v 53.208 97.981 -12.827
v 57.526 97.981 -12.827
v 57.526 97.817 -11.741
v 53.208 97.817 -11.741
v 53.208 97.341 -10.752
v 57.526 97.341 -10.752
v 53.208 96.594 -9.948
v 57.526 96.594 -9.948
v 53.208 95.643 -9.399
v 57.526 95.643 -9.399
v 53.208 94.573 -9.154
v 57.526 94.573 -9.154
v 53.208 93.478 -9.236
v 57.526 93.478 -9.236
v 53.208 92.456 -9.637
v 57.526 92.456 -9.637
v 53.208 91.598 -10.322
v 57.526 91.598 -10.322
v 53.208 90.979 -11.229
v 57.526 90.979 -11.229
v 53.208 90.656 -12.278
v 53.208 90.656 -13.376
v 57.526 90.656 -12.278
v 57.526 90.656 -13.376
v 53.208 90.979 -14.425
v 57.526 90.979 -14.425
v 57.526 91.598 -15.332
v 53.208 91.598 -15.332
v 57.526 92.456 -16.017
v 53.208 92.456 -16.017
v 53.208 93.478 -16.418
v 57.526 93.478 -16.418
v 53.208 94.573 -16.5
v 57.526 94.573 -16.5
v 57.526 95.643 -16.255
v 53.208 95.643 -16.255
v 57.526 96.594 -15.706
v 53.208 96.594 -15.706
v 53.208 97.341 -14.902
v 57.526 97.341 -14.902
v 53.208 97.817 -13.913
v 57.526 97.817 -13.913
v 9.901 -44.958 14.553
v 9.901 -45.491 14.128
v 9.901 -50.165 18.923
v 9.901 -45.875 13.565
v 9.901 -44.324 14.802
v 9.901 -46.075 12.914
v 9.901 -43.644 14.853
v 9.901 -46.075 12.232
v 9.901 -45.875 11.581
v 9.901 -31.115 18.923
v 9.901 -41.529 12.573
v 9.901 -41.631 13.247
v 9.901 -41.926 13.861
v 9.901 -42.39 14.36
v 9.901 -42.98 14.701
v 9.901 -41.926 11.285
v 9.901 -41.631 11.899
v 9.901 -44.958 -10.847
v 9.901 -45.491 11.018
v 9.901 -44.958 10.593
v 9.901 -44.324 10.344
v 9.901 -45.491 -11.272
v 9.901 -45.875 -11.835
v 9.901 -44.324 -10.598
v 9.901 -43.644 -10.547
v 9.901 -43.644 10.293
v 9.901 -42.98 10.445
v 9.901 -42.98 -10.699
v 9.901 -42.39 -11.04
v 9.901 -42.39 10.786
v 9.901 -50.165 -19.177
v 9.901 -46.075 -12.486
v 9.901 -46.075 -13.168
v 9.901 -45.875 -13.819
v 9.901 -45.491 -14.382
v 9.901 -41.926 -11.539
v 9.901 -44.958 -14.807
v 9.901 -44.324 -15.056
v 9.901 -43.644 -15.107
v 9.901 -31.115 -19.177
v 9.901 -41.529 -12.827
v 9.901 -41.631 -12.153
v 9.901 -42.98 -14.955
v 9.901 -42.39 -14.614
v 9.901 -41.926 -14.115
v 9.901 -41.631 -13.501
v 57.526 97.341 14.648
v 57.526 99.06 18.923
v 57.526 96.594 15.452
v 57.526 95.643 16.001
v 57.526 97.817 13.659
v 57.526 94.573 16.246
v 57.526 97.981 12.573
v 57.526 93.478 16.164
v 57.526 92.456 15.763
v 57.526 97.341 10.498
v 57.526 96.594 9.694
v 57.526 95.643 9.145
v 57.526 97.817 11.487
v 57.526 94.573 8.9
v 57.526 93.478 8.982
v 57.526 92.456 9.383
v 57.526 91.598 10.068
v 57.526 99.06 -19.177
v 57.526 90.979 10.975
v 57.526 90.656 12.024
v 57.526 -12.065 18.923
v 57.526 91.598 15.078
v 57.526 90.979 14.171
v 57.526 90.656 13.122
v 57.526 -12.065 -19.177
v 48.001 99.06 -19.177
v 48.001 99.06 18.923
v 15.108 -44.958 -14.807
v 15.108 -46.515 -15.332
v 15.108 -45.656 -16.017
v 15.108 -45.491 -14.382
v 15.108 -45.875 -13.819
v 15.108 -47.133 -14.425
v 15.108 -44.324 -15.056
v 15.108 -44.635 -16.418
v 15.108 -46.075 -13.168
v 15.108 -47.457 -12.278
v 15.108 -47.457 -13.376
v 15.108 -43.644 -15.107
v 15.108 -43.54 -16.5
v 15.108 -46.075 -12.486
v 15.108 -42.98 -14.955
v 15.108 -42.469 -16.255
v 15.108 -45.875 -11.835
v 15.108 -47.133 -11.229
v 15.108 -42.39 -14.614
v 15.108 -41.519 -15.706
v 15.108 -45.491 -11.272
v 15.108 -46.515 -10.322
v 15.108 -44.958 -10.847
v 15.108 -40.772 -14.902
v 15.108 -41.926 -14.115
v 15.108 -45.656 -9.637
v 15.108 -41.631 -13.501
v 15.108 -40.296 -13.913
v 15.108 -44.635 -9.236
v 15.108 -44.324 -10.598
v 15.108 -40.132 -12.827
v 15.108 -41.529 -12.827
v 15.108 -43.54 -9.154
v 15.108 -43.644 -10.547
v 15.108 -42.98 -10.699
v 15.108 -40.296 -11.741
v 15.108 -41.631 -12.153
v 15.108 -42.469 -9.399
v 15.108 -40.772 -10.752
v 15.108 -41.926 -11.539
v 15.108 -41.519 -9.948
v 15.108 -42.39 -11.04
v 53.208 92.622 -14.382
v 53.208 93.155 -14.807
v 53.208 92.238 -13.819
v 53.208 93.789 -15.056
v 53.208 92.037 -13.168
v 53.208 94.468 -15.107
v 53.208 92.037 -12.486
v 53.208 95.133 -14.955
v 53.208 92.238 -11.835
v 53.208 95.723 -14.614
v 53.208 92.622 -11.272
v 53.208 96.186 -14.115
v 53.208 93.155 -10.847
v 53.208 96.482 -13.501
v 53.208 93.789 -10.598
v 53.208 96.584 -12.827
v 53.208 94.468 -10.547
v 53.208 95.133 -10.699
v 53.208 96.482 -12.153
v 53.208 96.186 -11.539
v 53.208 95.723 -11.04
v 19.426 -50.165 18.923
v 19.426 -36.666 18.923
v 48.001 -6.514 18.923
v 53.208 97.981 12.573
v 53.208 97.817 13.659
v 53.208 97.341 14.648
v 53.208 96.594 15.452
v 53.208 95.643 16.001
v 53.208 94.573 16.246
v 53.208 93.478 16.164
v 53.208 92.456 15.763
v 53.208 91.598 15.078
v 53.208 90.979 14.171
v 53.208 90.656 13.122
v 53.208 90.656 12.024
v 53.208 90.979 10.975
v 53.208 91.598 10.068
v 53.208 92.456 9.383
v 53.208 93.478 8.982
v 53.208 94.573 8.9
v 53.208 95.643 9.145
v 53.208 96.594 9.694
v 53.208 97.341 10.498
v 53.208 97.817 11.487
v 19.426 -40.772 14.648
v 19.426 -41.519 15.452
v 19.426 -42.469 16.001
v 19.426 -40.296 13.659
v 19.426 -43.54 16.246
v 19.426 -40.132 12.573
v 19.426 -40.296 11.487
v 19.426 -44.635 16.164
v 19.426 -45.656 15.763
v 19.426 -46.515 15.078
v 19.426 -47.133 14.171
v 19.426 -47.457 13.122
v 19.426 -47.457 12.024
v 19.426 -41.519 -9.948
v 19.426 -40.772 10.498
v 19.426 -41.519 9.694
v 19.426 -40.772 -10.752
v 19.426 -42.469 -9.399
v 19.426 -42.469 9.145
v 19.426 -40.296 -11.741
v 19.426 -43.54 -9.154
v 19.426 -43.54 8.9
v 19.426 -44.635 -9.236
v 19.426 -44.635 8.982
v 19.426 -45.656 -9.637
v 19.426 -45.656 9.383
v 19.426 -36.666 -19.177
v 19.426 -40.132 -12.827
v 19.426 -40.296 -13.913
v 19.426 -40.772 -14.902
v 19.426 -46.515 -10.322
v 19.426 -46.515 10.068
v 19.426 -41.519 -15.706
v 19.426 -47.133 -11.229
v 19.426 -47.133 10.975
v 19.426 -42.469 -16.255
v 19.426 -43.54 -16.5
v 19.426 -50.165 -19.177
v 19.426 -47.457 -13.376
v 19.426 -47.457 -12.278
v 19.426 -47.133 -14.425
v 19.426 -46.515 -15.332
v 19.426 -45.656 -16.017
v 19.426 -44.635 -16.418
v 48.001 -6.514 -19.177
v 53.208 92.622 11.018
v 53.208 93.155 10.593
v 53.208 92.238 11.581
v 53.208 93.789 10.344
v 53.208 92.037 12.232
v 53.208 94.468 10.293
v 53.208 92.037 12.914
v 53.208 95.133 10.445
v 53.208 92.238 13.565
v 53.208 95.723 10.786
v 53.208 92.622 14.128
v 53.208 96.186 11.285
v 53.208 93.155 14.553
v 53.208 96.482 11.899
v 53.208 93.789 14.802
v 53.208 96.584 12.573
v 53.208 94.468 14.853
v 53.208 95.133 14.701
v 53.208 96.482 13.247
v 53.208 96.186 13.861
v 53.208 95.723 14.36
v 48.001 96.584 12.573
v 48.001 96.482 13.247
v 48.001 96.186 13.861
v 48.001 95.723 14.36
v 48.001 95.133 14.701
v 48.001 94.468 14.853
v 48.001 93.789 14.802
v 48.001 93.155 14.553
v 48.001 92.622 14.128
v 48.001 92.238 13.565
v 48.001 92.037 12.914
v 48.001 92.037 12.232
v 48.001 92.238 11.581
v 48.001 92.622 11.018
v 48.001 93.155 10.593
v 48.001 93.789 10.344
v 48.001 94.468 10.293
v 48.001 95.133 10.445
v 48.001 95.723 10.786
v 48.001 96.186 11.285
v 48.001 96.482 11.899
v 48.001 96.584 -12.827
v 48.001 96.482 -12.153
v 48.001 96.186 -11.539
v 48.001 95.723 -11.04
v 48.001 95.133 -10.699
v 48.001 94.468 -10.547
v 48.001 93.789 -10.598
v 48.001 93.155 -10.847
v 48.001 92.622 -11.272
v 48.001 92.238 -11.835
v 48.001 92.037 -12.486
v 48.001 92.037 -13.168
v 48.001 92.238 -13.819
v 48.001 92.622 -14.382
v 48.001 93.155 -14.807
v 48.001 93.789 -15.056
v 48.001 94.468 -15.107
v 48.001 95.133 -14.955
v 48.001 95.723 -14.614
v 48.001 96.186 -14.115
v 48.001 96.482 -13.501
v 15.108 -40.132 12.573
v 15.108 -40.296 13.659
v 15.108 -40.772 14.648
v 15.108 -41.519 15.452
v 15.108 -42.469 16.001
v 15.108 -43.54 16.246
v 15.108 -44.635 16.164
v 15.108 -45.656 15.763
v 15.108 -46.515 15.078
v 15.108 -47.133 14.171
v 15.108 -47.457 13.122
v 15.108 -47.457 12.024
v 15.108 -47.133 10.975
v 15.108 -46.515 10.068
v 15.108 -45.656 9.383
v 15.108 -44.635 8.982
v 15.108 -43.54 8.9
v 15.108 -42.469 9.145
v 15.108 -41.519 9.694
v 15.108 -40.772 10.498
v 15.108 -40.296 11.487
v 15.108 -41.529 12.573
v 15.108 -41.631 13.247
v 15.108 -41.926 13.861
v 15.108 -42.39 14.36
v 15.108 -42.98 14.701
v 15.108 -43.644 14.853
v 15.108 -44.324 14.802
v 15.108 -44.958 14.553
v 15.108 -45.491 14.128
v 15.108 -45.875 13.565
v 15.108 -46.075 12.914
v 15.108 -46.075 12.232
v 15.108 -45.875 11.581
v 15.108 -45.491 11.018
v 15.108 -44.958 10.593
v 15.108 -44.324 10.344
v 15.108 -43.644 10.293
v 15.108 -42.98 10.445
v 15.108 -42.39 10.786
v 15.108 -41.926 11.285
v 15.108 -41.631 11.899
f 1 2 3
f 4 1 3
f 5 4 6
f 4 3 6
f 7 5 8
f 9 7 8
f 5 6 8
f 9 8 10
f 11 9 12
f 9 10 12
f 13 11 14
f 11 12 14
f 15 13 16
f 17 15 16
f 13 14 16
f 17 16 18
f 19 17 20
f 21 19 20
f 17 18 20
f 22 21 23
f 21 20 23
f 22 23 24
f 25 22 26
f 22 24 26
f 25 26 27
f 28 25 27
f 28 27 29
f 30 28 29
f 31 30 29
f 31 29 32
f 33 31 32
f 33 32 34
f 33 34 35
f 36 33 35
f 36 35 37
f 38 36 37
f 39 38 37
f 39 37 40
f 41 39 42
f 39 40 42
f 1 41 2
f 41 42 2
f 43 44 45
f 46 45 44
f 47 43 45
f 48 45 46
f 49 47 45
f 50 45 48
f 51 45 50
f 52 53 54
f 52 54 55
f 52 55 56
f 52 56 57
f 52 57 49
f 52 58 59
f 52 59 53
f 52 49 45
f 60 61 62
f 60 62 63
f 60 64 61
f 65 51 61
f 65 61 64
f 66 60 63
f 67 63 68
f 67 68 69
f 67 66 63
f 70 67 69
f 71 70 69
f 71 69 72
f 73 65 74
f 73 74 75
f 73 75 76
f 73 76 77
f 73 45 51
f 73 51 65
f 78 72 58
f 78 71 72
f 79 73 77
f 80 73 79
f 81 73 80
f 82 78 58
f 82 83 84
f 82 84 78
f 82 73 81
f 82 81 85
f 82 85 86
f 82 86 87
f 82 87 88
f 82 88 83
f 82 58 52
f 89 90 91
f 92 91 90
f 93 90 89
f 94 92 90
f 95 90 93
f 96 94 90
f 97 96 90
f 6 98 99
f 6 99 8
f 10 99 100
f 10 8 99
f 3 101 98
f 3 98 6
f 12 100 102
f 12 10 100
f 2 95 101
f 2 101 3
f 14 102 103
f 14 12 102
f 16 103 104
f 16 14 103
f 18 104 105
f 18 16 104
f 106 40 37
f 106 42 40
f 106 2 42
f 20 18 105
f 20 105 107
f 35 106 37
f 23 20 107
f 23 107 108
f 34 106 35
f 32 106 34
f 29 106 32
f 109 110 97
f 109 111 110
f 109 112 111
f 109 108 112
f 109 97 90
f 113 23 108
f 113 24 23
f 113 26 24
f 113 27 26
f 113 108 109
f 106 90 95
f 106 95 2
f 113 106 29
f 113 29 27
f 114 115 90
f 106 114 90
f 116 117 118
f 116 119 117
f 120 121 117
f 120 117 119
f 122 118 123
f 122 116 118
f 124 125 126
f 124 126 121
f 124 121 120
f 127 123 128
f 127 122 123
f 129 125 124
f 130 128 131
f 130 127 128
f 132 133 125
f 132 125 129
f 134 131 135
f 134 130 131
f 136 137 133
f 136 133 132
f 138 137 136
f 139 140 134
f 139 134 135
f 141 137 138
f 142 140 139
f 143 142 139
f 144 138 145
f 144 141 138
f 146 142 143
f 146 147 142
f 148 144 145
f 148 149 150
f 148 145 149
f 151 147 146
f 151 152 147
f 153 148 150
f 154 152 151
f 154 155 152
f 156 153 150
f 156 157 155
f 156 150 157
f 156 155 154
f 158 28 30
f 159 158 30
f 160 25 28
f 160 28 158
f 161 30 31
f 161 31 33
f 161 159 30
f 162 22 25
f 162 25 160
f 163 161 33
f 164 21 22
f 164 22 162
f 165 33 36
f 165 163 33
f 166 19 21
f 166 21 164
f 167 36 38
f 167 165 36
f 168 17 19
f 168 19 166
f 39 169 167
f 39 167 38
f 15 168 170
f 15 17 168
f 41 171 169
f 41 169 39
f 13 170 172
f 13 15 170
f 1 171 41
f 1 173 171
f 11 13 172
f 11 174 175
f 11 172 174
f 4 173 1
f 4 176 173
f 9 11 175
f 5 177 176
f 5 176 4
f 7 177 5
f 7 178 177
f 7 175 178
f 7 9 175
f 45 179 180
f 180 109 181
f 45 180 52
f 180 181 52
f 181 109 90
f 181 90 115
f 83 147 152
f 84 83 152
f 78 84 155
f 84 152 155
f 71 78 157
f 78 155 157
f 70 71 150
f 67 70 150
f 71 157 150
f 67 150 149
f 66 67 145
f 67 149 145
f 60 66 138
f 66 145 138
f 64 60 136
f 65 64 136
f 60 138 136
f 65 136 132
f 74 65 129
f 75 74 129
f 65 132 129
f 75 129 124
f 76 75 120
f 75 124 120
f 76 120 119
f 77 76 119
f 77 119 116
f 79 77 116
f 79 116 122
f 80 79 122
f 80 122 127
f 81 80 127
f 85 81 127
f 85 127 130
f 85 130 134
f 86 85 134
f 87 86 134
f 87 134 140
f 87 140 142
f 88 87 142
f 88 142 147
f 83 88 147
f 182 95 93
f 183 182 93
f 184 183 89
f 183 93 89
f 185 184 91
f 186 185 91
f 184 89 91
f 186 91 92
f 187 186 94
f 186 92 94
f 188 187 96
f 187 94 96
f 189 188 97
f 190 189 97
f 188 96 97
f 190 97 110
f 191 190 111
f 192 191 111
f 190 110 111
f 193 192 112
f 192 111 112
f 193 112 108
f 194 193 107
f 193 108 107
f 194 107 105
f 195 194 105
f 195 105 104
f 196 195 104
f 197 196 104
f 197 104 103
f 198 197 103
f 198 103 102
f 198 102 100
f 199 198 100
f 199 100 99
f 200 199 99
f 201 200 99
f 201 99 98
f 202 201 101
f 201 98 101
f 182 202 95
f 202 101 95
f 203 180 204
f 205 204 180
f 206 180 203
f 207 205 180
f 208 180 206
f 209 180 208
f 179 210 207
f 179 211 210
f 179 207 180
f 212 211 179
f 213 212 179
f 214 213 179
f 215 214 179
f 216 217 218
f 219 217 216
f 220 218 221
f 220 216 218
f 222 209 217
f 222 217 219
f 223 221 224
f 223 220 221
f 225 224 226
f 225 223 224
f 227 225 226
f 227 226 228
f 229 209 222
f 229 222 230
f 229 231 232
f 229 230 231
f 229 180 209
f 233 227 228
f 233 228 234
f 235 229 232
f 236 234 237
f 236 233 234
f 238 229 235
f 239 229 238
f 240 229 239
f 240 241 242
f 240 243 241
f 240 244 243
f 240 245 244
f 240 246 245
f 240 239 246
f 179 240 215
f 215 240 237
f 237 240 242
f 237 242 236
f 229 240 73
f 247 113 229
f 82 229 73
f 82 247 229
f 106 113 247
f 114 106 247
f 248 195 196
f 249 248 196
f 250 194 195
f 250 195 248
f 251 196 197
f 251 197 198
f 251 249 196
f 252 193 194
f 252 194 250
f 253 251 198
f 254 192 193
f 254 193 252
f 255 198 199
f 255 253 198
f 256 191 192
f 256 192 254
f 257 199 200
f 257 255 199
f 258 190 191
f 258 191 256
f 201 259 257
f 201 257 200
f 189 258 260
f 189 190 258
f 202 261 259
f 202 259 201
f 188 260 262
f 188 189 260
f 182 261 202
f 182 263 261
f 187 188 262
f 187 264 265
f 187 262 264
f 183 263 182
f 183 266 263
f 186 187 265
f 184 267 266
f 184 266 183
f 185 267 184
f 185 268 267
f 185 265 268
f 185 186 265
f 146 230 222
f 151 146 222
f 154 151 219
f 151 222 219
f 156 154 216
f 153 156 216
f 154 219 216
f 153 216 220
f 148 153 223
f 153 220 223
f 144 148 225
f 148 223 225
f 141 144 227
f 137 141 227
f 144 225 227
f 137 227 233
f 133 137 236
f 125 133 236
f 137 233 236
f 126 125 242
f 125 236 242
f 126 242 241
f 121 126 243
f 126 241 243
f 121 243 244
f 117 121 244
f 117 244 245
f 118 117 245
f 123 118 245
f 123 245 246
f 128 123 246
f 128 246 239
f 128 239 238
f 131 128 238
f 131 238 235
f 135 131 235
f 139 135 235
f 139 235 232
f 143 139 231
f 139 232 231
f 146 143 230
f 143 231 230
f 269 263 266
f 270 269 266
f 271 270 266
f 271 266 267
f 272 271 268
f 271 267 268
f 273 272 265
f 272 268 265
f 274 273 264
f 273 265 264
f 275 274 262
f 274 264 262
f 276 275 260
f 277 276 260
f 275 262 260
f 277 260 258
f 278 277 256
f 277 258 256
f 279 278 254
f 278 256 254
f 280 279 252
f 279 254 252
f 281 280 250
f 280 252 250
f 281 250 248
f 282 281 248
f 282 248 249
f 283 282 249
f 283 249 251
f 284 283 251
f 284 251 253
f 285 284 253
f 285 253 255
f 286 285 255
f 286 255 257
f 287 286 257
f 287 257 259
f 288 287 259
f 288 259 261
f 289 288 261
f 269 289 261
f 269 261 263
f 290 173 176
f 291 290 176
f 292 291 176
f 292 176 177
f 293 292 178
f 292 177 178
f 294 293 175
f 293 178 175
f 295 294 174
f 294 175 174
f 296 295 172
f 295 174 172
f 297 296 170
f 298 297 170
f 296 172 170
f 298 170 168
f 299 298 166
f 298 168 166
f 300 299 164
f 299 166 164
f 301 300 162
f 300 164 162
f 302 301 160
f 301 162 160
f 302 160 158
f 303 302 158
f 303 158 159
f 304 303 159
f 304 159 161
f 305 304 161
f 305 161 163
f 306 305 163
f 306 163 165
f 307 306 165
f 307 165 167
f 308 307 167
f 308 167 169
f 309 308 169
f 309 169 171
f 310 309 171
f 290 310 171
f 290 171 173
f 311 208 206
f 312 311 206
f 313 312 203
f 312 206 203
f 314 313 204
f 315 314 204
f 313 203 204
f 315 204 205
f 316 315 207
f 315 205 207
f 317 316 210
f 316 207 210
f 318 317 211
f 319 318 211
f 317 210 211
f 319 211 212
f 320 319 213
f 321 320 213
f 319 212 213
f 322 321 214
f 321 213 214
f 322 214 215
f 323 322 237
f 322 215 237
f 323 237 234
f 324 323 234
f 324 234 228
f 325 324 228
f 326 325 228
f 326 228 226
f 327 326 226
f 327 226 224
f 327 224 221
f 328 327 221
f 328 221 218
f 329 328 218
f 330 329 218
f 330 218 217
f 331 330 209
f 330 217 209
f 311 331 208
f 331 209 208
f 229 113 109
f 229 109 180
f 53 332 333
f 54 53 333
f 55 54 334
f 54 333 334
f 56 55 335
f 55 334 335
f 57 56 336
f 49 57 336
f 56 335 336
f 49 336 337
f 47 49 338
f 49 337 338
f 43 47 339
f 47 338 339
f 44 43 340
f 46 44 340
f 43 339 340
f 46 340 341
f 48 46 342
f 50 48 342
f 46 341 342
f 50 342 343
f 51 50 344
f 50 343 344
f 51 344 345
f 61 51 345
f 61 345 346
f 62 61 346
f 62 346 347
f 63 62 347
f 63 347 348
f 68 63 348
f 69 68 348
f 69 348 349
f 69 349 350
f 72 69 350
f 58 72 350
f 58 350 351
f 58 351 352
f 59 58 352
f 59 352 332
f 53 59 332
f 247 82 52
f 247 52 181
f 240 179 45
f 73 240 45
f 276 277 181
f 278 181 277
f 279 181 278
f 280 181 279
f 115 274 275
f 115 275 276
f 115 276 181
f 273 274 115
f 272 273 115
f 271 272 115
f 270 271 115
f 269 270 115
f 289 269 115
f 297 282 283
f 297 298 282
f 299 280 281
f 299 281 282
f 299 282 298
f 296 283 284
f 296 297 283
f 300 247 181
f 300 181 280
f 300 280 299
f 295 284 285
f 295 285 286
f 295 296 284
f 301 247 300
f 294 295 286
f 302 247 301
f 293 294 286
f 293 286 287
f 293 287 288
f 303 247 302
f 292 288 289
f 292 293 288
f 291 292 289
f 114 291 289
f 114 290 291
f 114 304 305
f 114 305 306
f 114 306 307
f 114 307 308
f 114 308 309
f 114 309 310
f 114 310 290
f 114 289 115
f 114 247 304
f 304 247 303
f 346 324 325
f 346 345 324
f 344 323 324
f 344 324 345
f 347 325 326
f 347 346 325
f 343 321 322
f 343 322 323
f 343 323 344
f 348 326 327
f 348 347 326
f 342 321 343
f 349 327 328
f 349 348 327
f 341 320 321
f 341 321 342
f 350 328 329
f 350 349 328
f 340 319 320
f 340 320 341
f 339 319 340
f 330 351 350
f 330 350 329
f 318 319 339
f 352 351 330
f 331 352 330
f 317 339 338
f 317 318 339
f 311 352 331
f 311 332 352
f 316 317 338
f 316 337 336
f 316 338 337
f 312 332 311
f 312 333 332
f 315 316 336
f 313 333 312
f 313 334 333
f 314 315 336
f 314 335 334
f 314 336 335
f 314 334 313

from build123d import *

# Parameters (mm, degrees)
PAD040_DEPTH    = 38.1
SKETCH080_R     = 2.286
POCKET008_DEPTH = 47.626
SKETCH081_R     = 3.683
POCKET009_DEPTH = 4.318
SKETCH082_R     = 3.683
POCKET010_DEPTH = 4.318


with BuildPart() as part:
    # Sketch079 → Pad040 (new body)
    with BuildSketch(Plane.XY):
        Polygon((47.239487, 111.25203), (56.764487, 111.25203), (56.764487, 0.12703), (18.664487, -24.473997), (18.664487, -37.97297), (9.139487, -37.97297), (9.139487, -18.92297), (47.239487, 5.678057), align=None)
    extrude(amount=PAD040_DEPTH)

    # Sketch080 (on Face4 of Pad040) → Pocket008 (cut, through all)
    with BuildSketch(Plane.YZ.offset(56.764487)):
        with Locations((106.48953, 31.75)):
            Circle(SKETCH080_R)
        with Locations((106.48953, 6.35)):
            Circle(SKETCH080_R)
        with Locations((-31.62297, 31.75)):
            Circle(SKETCH080_R)
        with Locations((-31.62297, 6.35)):
            Circle(SKETCH080_R)
    extrude(amount=-POCKET008_DEPTH, mode=Mode.SUBTRACT)

    # Sketch081 (on Face12 of Pocket008) → Pocket009 (cut)
    with BuildSketch(Plane.YZ.offset(56.764487)):
        with Locations((106.48953, 31.75)):
            Circle(SKETCH081_R)
        with Locations((106.48953, 6.35)):
            Circle(SKETCH081_R)
    extrude(amount=-POCKET009_DEPTH, mode=Mode.SUBTRACT)

    # Sketch082 (on Face14 of Pocket009) → Pocket010 (cut)
    with BuildSketch(Plane.YZ.offset(18.664487)):
        with Locations((-31.62297, 31.75)):
            Circle(SKETCH082_R)
        with Locations((-31.62297, 6.35)):
            Circle(SKETCH082_R)
    extrude(amount=-POCKET010_DEPTH, mode=Mode.SUBTRACT)


with BuildPart() as part_1:
    # Body005 placement: moved
    add(part.part.moved(Location((0.762, -12.192, -19.177))))


solid = part_1.part
